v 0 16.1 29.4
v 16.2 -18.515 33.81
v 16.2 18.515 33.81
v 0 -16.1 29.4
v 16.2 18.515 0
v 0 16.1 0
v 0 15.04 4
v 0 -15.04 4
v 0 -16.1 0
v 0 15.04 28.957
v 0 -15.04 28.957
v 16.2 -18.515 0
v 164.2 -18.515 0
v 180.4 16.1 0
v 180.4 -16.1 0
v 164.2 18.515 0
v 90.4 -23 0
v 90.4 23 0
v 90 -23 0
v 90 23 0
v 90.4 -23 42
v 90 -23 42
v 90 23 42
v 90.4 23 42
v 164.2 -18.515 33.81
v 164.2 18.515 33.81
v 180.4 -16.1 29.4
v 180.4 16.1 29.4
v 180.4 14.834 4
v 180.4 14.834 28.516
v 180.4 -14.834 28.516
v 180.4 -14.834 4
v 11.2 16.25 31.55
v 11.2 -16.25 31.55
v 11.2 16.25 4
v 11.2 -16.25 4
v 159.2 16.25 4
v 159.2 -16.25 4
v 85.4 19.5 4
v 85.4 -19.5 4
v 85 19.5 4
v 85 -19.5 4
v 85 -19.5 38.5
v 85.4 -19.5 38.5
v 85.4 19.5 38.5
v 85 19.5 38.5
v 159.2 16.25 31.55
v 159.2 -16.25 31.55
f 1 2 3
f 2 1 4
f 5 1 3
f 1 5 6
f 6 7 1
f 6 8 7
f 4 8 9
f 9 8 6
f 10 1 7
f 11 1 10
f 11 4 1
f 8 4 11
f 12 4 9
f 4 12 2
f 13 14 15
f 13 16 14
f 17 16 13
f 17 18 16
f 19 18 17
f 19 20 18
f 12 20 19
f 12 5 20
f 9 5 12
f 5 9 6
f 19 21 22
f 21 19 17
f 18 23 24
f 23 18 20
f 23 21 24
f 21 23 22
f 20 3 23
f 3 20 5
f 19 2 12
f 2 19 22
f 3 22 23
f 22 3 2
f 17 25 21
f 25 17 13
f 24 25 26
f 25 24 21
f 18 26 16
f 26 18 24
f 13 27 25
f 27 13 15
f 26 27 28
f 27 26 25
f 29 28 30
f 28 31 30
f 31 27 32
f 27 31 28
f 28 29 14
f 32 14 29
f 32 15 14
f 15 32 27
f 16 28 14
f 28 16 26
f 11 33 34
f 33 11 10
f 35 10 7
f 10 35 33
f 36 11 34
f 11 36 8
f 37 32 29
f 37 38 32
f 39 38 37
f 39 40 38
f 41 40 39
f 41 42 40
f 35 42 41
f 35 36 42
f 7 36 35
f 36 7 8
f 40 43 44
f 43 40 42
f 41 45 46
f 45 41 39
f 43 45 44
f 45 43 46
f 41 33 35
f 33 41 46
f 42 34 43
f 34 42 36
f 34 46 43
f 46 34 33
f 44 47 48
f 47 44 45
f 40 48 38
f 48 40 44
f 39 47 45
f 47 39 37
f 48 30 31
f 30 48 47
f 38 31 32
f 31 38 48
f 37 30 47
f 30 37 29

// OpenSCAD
$fn = 32;

// ----------------------------------------------------------------------
// Faired channel: 180 x 46 x 42 mm, 3.5 mm walls, faired ends
// ----------------------------------------------------------------------

// --- parameters (mm) ---
length = 180;             // channel length
width = 46;               // channel width at mid length
height = 42;              // channel height at mid length
wall = 3.5;               // side wall thickness
floor_t = 4;              // floor thickness
end_w = 32.2;             // faired end width
end_h = 29.4;             // faired end height

difference() {
  union() {
    hull() {
      translate([0, -16.1, 0]) cube([0.4, 32.2, 29.4]);
      translate([16.2, -18.515, 0]) cube([0.4, 37.03, 33.81]);
    }
    hull() {
      translate([16.2, -18.515, 0]) cube([0.4, 37.03, 33.81]);
      translate([90, -23, 0]) cube([0.4, 46, 42]);
    }
    hull() {
      translate([90, -23, 0]) cube([0.4, 46, 42]);
      translate([163.8, -18.515, 0]) cube([0.4, 37.03, 33.81]);
    }
    hull() {
      translate([163.8, -18.515, 0]) cube([0.4, 37.03, 33.81]);
      translate([180, -16.1, 0]) cube([0.4, 32.2, 29.4]);
    }
  }
  /* cavity, 5 mm proud of both ends so the ports are cut clean */
  hull() {
    translate([-5, -14.5, 4]) cube([0.4, 29, 23.8]);
    translate([11.2, -16.25, 4]) cube([0.4, 32.5, 27.55]);
  }
  hull() {
    translate([11.2, -16.25, 4]) cube([0.4, 32.5, 27.55]);
    translate([85, -19.5, 4]) cube([0.4, 39, 34.5]);
  }
  hull() {
    translate([85, -19.5, 4]) cube([0.4, 39, 34.5]);
    translate([158.8, -16.25, 4]) cube([0.4, 32.5, 27.55]);
  }
  hull() {
    translate([158.8, -16.25, 4]) cube([0.4, 32.5, 27.55]);
    translate([185, -14.5, 4]) cube([0.4, 29, 23.8]);
  }
}
